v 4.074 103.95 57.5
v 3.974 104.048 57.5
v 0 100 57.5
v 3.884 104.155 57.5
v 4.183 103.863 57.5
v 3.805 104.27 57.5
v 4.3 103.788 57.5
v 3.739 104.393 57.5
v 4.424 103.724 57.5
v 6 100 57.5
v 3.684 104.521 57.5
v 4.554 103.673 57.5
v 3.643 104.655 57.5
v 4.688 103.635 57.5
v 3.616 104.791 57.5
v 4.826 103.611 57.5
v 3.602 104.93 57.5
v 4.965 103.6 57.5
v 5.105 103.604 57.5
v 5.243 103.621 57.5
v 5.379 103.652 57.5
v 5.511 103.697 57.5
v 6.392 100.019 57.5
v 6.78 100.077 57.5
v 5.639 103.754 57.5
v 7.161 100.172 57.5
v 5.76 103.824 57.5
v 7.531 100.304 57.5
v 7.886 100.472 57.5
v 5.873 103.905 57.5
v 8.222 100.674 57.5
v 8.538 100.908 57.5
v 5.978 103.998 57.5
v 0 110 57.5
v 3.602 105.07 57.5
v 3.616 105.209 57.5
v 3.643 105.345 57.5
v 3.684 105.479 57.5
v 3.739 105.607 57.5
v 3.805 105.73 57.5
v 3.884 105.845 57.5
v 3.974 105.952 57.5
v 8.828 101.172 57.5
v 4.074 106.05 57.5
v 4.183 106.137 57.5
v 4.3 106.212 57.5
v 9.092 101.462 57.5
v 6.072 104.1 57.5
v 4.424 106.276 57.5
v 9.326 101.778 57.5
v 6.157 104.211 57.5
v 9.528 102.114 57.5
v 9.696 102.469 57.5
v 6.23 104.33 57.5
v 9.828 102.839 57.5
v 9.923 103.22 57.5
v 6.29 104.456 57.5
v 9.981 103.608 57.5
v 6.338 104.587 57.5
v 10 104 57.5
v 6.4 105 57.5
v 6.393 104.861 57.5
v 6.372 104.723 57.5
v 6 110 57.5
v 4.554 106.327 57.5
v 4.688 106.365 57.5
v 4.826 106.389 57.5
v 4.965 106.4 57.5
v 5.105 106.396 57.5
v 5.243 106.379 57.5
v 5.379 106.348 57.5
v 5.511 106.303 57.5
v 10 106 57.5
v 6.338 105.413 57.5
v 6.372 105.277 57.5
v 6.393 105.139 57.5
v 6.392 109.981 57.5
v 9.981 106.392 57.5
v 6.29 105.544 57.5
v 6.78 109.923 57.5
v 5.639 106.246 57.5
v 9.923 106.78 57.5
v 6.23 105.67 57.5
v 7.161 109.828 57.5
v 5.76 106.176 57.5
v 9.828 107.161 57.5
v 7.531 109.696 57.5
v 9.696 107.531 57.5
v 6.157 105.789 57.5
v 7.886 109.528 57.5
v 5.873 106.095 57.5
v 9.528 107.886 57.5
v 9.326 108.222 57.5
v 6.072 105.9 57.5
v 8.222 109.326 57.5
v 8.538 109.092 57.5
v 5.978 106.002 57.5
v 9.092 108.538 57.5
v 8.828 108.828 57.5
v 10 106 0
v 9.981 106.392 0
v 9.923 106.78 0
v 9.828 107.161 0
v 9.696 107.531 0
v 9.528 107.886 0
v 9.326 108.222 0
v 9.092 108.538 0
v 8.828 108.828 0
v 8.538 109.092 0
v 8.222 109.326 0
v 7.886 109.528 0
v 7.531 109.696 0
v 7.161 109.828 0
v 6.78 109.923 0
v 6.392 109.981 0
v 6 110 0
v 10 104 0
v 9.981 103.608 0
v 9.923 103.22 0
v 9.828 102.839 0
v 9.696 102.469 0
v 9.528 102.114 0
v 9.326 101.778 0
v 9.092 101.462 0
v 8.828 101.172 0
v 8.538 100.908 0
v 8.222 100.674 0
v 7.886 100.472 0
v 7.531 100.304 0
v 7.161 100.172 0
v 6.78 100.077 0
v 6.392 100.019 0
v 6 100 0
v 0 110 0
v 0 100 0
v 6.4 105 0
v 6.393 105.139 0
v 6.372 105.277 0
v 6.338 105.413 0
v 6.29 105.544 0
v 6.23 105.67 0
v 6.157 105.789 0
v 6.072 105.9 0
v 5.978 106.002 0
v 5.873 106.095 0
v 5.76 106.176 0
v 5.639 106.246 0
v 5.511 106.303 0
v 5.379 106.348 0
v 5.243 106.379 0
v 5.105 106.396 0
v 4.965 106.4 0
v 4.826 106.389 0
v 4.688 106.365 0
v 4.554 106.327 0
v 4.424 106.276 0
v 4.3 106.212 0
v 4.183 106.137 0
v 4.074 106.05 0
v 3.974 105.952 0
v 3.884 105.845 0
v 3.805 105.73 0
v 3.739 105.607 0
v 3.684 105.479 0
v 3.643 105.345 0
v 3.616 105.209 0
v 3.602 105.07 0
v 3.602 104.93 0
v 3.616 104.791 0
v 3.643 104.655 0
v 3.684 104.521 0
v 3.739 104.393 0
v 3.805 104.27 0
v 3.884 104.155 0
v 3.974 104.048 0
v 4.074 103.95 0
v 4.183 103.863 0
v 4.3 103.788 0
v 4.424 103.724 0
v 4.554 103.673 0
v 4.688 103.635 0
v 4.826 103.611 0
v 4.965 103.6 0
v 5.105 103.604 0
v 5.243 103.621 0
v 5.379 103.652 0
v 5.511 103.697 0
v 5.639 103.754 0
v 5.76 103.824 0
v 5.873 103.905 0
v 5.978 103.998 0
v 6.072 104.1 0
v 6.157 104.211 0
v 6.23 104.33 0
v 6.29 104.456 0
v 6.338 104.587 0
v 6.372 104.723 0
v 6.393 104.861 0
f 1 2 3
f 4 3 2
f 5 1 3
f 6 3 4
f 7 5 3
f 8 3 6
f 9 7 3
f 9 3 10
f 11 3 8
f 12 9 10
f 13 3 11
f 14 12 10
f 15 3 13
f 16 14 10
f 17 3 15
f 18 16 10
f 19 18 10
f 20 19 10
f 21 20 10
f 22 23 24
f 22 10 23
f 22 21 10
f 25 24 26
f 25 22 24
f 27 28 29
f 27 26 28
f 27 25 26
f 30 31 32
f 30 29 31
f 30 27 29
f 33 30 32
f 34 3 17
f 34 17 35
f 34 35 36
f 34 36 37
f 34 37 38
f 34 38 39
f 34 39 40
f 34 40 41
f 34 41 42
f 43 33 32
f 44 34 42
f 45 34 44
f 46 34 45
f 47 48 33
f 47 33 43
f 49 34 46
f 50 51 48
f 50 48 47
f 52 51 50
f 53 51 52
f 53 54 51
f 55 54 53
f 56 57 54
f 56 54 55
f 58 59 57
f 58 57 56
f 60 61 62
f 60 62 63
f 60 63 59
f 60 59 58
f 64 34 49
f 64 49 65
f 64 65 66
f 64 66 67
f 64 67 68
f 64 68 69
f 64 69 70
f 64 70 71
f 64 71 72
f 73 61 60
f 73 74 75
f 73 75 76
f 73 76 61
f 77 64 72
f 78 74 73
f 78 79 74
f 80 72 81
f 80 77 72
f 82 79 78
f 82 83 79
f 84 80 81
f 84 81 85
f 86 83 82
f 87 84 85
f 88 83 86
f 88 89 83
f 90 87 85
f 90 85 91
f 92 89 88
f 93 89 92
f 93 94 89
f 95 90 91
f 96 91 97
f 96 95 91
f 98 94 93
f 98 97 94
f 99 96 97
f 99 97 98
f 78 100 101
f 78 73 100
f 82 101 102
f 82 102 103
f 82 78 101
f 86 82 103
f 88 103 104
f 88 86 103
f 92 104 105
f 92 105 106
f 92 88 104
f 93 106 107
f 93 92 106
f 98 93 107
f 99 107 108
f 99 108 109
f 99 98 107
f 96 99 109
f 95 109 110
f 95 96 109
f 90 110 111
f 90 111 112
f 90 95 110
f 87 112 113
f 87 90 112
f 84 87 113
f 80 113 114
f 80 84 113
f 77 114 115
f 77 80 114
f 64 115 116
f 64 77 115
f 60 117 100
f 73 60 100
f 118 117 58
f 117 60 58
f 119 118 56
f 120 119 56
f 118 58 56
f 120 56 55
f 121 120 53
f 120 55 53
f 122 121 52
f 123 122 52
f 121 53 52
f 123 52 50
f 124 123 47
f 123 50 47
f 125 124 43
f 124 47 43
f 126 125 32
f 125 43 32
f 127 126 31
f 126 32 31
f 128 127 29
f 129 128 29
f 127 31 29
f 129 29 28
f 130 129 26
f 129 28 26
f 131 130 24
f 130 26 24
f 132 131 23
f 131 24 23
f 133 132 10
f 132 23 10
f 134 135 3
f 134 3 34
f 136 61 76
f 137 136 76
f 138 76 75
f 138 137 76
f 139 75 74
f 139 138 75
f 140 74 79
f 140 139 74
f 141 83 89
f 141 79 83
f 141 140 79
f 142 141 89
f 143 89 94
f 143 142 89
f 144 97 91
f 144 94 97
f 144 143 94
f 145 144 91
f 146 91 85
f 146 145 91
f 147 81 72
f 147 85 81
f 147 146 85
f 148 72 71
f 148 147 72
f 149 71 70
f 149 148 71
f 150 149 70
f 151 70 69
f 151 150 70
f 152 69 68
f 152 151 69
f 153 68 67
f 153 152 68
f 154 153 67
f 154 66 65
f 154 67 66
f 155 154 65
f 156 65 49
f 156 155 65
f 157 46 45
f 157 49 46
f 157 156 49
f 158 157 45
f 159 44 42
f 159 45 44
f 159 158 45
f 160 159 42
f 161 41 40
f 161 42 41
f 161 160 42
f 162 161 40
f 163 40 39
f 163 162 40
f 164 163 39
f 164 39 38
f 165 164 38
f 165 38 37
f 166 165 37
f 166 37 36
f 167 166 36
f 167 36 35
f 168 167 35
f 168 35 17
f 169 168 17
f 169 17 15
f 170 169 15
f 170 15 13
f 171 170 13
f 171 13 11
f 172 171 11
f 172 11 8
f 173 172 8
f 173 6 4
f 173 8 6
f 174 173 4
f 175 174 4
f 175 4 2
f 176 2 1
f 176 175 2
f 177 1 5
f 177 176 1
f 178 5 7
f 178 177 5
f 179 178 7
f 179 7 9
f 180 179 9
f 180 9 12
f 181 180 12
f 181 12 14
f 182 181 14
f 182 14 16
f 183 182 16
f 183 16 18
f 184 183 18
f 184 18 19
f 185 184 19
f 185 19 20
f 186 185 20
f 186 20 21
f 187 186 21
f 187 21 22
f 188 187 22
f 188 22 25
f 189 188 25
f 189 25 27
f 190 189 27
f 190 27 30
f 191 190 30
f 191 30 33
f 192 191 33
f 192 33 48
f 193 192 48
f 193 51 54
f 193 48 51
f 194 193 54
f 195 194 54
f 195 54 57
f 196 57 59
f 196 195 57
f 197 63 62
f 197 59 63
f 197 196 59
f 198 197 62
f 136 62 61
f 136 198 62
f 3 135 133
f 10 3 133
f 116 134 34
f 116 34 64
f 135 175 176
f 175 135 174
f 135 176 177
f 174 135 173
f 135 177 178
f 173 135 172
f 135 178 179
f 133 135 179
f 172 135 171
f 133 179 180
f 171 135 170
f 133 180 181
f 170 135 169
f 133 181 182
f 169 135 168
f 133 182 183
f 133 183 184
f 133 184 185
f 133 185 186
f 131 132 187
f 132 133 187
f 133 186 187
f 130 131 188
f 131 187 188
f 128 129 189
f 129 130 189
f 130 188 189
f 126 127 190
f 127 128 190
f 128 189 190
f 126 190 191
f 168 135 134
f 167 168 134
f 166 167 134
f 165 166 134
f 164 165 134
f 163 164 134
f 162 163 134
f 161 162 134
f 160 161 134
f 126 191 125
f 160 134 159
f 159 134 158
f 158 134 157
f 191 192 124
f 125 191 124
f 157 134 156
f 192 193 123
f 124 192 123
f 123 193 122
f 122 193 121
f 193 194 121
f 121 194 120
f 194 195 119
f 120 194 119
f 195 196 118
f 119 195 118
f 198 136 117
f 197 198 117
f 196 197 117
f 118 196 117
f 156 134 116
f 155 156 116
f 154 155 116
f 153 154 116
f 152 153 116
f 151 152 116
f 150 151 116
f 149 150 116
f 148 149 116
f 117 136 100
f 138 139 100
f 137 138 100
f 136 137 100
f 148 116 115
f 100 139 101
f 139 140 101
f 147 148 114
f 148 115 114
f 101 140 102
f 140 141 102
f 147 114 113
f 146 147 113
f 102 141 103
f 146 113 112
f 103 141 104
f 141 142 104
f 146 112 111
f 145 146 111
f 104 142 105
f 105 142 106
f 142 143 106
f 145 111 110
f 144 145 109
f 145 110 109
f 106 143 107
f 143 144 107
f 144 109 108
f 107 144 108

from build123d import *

# Parameters (mm, degrees)
CYLINDER004_R     = 1.4
CYLINDER004_DEPTH = 61
CYLINDER003_R     = 1.4
CYLINDER003_DEPTH = 10
BOX_W             = 10
BOX_H             = 10
BOX_DEPTH         = 57.5
FILLET_R          = 4
FILLET001_R       = 4


with BuildPart() as cylinder004:
    # Cylinder004 → Cylinder004 (new body)
    with BuildSketch(Plane(origin=(5, 105, -1.5), x_dir=(1, 0, 0), z_dir=(0, 0, 1))):
        Circle(CYLINDER004_R)
    extrude(amount=CYLINDER004_DEPTH)


with BuildPart() as cylinder003:
    # Cylinder003 → Cylinder003 (new body)
    with BuildSketch(Plane(origin=(5, 105, -1), x_dir=(1, 0, 0), z_dir=(0, 0, 1))):
        Circle(CYLINDER003_R)
    extrude(amount=CYLINDER003_DEPTH)


with BuildPart() as spacer:
    # Box → Box (new body)
    with BuildSketch(Plane(origin=(0, 100, 0), x_dir=(1, 0, 0), z_dir=(0, 0, 1))):
        with Locations((5, 5)):
            Rectangle(BOX_W, BOX_H)
    extrude(amount=BOX_DEPTH)

    # Cut003: cut Cylinder003
    add(cylinder003.part, mode=Mode.SUBTRACT)

    # Cut004: cut Cylinder004
    add(cylinder004.part, mode=Mode.SUBTRACT)

    # Fillet
    fillet_edges = [spacer.edges().sort_by_distance(p)[0] for p in [
        (10, 110, 28.75),
    ]]
    fillet(fillet_edges, radius=FILLET_R)

    # Fillet001
    fillet001_edges = [spacer.edges().sort_by_distance(p)[0] for p in [
        (10, 100, 28.75),
    ]]
    fillet(fillet001_edges, radius=FILLET001_R)


solid = spacer.part
